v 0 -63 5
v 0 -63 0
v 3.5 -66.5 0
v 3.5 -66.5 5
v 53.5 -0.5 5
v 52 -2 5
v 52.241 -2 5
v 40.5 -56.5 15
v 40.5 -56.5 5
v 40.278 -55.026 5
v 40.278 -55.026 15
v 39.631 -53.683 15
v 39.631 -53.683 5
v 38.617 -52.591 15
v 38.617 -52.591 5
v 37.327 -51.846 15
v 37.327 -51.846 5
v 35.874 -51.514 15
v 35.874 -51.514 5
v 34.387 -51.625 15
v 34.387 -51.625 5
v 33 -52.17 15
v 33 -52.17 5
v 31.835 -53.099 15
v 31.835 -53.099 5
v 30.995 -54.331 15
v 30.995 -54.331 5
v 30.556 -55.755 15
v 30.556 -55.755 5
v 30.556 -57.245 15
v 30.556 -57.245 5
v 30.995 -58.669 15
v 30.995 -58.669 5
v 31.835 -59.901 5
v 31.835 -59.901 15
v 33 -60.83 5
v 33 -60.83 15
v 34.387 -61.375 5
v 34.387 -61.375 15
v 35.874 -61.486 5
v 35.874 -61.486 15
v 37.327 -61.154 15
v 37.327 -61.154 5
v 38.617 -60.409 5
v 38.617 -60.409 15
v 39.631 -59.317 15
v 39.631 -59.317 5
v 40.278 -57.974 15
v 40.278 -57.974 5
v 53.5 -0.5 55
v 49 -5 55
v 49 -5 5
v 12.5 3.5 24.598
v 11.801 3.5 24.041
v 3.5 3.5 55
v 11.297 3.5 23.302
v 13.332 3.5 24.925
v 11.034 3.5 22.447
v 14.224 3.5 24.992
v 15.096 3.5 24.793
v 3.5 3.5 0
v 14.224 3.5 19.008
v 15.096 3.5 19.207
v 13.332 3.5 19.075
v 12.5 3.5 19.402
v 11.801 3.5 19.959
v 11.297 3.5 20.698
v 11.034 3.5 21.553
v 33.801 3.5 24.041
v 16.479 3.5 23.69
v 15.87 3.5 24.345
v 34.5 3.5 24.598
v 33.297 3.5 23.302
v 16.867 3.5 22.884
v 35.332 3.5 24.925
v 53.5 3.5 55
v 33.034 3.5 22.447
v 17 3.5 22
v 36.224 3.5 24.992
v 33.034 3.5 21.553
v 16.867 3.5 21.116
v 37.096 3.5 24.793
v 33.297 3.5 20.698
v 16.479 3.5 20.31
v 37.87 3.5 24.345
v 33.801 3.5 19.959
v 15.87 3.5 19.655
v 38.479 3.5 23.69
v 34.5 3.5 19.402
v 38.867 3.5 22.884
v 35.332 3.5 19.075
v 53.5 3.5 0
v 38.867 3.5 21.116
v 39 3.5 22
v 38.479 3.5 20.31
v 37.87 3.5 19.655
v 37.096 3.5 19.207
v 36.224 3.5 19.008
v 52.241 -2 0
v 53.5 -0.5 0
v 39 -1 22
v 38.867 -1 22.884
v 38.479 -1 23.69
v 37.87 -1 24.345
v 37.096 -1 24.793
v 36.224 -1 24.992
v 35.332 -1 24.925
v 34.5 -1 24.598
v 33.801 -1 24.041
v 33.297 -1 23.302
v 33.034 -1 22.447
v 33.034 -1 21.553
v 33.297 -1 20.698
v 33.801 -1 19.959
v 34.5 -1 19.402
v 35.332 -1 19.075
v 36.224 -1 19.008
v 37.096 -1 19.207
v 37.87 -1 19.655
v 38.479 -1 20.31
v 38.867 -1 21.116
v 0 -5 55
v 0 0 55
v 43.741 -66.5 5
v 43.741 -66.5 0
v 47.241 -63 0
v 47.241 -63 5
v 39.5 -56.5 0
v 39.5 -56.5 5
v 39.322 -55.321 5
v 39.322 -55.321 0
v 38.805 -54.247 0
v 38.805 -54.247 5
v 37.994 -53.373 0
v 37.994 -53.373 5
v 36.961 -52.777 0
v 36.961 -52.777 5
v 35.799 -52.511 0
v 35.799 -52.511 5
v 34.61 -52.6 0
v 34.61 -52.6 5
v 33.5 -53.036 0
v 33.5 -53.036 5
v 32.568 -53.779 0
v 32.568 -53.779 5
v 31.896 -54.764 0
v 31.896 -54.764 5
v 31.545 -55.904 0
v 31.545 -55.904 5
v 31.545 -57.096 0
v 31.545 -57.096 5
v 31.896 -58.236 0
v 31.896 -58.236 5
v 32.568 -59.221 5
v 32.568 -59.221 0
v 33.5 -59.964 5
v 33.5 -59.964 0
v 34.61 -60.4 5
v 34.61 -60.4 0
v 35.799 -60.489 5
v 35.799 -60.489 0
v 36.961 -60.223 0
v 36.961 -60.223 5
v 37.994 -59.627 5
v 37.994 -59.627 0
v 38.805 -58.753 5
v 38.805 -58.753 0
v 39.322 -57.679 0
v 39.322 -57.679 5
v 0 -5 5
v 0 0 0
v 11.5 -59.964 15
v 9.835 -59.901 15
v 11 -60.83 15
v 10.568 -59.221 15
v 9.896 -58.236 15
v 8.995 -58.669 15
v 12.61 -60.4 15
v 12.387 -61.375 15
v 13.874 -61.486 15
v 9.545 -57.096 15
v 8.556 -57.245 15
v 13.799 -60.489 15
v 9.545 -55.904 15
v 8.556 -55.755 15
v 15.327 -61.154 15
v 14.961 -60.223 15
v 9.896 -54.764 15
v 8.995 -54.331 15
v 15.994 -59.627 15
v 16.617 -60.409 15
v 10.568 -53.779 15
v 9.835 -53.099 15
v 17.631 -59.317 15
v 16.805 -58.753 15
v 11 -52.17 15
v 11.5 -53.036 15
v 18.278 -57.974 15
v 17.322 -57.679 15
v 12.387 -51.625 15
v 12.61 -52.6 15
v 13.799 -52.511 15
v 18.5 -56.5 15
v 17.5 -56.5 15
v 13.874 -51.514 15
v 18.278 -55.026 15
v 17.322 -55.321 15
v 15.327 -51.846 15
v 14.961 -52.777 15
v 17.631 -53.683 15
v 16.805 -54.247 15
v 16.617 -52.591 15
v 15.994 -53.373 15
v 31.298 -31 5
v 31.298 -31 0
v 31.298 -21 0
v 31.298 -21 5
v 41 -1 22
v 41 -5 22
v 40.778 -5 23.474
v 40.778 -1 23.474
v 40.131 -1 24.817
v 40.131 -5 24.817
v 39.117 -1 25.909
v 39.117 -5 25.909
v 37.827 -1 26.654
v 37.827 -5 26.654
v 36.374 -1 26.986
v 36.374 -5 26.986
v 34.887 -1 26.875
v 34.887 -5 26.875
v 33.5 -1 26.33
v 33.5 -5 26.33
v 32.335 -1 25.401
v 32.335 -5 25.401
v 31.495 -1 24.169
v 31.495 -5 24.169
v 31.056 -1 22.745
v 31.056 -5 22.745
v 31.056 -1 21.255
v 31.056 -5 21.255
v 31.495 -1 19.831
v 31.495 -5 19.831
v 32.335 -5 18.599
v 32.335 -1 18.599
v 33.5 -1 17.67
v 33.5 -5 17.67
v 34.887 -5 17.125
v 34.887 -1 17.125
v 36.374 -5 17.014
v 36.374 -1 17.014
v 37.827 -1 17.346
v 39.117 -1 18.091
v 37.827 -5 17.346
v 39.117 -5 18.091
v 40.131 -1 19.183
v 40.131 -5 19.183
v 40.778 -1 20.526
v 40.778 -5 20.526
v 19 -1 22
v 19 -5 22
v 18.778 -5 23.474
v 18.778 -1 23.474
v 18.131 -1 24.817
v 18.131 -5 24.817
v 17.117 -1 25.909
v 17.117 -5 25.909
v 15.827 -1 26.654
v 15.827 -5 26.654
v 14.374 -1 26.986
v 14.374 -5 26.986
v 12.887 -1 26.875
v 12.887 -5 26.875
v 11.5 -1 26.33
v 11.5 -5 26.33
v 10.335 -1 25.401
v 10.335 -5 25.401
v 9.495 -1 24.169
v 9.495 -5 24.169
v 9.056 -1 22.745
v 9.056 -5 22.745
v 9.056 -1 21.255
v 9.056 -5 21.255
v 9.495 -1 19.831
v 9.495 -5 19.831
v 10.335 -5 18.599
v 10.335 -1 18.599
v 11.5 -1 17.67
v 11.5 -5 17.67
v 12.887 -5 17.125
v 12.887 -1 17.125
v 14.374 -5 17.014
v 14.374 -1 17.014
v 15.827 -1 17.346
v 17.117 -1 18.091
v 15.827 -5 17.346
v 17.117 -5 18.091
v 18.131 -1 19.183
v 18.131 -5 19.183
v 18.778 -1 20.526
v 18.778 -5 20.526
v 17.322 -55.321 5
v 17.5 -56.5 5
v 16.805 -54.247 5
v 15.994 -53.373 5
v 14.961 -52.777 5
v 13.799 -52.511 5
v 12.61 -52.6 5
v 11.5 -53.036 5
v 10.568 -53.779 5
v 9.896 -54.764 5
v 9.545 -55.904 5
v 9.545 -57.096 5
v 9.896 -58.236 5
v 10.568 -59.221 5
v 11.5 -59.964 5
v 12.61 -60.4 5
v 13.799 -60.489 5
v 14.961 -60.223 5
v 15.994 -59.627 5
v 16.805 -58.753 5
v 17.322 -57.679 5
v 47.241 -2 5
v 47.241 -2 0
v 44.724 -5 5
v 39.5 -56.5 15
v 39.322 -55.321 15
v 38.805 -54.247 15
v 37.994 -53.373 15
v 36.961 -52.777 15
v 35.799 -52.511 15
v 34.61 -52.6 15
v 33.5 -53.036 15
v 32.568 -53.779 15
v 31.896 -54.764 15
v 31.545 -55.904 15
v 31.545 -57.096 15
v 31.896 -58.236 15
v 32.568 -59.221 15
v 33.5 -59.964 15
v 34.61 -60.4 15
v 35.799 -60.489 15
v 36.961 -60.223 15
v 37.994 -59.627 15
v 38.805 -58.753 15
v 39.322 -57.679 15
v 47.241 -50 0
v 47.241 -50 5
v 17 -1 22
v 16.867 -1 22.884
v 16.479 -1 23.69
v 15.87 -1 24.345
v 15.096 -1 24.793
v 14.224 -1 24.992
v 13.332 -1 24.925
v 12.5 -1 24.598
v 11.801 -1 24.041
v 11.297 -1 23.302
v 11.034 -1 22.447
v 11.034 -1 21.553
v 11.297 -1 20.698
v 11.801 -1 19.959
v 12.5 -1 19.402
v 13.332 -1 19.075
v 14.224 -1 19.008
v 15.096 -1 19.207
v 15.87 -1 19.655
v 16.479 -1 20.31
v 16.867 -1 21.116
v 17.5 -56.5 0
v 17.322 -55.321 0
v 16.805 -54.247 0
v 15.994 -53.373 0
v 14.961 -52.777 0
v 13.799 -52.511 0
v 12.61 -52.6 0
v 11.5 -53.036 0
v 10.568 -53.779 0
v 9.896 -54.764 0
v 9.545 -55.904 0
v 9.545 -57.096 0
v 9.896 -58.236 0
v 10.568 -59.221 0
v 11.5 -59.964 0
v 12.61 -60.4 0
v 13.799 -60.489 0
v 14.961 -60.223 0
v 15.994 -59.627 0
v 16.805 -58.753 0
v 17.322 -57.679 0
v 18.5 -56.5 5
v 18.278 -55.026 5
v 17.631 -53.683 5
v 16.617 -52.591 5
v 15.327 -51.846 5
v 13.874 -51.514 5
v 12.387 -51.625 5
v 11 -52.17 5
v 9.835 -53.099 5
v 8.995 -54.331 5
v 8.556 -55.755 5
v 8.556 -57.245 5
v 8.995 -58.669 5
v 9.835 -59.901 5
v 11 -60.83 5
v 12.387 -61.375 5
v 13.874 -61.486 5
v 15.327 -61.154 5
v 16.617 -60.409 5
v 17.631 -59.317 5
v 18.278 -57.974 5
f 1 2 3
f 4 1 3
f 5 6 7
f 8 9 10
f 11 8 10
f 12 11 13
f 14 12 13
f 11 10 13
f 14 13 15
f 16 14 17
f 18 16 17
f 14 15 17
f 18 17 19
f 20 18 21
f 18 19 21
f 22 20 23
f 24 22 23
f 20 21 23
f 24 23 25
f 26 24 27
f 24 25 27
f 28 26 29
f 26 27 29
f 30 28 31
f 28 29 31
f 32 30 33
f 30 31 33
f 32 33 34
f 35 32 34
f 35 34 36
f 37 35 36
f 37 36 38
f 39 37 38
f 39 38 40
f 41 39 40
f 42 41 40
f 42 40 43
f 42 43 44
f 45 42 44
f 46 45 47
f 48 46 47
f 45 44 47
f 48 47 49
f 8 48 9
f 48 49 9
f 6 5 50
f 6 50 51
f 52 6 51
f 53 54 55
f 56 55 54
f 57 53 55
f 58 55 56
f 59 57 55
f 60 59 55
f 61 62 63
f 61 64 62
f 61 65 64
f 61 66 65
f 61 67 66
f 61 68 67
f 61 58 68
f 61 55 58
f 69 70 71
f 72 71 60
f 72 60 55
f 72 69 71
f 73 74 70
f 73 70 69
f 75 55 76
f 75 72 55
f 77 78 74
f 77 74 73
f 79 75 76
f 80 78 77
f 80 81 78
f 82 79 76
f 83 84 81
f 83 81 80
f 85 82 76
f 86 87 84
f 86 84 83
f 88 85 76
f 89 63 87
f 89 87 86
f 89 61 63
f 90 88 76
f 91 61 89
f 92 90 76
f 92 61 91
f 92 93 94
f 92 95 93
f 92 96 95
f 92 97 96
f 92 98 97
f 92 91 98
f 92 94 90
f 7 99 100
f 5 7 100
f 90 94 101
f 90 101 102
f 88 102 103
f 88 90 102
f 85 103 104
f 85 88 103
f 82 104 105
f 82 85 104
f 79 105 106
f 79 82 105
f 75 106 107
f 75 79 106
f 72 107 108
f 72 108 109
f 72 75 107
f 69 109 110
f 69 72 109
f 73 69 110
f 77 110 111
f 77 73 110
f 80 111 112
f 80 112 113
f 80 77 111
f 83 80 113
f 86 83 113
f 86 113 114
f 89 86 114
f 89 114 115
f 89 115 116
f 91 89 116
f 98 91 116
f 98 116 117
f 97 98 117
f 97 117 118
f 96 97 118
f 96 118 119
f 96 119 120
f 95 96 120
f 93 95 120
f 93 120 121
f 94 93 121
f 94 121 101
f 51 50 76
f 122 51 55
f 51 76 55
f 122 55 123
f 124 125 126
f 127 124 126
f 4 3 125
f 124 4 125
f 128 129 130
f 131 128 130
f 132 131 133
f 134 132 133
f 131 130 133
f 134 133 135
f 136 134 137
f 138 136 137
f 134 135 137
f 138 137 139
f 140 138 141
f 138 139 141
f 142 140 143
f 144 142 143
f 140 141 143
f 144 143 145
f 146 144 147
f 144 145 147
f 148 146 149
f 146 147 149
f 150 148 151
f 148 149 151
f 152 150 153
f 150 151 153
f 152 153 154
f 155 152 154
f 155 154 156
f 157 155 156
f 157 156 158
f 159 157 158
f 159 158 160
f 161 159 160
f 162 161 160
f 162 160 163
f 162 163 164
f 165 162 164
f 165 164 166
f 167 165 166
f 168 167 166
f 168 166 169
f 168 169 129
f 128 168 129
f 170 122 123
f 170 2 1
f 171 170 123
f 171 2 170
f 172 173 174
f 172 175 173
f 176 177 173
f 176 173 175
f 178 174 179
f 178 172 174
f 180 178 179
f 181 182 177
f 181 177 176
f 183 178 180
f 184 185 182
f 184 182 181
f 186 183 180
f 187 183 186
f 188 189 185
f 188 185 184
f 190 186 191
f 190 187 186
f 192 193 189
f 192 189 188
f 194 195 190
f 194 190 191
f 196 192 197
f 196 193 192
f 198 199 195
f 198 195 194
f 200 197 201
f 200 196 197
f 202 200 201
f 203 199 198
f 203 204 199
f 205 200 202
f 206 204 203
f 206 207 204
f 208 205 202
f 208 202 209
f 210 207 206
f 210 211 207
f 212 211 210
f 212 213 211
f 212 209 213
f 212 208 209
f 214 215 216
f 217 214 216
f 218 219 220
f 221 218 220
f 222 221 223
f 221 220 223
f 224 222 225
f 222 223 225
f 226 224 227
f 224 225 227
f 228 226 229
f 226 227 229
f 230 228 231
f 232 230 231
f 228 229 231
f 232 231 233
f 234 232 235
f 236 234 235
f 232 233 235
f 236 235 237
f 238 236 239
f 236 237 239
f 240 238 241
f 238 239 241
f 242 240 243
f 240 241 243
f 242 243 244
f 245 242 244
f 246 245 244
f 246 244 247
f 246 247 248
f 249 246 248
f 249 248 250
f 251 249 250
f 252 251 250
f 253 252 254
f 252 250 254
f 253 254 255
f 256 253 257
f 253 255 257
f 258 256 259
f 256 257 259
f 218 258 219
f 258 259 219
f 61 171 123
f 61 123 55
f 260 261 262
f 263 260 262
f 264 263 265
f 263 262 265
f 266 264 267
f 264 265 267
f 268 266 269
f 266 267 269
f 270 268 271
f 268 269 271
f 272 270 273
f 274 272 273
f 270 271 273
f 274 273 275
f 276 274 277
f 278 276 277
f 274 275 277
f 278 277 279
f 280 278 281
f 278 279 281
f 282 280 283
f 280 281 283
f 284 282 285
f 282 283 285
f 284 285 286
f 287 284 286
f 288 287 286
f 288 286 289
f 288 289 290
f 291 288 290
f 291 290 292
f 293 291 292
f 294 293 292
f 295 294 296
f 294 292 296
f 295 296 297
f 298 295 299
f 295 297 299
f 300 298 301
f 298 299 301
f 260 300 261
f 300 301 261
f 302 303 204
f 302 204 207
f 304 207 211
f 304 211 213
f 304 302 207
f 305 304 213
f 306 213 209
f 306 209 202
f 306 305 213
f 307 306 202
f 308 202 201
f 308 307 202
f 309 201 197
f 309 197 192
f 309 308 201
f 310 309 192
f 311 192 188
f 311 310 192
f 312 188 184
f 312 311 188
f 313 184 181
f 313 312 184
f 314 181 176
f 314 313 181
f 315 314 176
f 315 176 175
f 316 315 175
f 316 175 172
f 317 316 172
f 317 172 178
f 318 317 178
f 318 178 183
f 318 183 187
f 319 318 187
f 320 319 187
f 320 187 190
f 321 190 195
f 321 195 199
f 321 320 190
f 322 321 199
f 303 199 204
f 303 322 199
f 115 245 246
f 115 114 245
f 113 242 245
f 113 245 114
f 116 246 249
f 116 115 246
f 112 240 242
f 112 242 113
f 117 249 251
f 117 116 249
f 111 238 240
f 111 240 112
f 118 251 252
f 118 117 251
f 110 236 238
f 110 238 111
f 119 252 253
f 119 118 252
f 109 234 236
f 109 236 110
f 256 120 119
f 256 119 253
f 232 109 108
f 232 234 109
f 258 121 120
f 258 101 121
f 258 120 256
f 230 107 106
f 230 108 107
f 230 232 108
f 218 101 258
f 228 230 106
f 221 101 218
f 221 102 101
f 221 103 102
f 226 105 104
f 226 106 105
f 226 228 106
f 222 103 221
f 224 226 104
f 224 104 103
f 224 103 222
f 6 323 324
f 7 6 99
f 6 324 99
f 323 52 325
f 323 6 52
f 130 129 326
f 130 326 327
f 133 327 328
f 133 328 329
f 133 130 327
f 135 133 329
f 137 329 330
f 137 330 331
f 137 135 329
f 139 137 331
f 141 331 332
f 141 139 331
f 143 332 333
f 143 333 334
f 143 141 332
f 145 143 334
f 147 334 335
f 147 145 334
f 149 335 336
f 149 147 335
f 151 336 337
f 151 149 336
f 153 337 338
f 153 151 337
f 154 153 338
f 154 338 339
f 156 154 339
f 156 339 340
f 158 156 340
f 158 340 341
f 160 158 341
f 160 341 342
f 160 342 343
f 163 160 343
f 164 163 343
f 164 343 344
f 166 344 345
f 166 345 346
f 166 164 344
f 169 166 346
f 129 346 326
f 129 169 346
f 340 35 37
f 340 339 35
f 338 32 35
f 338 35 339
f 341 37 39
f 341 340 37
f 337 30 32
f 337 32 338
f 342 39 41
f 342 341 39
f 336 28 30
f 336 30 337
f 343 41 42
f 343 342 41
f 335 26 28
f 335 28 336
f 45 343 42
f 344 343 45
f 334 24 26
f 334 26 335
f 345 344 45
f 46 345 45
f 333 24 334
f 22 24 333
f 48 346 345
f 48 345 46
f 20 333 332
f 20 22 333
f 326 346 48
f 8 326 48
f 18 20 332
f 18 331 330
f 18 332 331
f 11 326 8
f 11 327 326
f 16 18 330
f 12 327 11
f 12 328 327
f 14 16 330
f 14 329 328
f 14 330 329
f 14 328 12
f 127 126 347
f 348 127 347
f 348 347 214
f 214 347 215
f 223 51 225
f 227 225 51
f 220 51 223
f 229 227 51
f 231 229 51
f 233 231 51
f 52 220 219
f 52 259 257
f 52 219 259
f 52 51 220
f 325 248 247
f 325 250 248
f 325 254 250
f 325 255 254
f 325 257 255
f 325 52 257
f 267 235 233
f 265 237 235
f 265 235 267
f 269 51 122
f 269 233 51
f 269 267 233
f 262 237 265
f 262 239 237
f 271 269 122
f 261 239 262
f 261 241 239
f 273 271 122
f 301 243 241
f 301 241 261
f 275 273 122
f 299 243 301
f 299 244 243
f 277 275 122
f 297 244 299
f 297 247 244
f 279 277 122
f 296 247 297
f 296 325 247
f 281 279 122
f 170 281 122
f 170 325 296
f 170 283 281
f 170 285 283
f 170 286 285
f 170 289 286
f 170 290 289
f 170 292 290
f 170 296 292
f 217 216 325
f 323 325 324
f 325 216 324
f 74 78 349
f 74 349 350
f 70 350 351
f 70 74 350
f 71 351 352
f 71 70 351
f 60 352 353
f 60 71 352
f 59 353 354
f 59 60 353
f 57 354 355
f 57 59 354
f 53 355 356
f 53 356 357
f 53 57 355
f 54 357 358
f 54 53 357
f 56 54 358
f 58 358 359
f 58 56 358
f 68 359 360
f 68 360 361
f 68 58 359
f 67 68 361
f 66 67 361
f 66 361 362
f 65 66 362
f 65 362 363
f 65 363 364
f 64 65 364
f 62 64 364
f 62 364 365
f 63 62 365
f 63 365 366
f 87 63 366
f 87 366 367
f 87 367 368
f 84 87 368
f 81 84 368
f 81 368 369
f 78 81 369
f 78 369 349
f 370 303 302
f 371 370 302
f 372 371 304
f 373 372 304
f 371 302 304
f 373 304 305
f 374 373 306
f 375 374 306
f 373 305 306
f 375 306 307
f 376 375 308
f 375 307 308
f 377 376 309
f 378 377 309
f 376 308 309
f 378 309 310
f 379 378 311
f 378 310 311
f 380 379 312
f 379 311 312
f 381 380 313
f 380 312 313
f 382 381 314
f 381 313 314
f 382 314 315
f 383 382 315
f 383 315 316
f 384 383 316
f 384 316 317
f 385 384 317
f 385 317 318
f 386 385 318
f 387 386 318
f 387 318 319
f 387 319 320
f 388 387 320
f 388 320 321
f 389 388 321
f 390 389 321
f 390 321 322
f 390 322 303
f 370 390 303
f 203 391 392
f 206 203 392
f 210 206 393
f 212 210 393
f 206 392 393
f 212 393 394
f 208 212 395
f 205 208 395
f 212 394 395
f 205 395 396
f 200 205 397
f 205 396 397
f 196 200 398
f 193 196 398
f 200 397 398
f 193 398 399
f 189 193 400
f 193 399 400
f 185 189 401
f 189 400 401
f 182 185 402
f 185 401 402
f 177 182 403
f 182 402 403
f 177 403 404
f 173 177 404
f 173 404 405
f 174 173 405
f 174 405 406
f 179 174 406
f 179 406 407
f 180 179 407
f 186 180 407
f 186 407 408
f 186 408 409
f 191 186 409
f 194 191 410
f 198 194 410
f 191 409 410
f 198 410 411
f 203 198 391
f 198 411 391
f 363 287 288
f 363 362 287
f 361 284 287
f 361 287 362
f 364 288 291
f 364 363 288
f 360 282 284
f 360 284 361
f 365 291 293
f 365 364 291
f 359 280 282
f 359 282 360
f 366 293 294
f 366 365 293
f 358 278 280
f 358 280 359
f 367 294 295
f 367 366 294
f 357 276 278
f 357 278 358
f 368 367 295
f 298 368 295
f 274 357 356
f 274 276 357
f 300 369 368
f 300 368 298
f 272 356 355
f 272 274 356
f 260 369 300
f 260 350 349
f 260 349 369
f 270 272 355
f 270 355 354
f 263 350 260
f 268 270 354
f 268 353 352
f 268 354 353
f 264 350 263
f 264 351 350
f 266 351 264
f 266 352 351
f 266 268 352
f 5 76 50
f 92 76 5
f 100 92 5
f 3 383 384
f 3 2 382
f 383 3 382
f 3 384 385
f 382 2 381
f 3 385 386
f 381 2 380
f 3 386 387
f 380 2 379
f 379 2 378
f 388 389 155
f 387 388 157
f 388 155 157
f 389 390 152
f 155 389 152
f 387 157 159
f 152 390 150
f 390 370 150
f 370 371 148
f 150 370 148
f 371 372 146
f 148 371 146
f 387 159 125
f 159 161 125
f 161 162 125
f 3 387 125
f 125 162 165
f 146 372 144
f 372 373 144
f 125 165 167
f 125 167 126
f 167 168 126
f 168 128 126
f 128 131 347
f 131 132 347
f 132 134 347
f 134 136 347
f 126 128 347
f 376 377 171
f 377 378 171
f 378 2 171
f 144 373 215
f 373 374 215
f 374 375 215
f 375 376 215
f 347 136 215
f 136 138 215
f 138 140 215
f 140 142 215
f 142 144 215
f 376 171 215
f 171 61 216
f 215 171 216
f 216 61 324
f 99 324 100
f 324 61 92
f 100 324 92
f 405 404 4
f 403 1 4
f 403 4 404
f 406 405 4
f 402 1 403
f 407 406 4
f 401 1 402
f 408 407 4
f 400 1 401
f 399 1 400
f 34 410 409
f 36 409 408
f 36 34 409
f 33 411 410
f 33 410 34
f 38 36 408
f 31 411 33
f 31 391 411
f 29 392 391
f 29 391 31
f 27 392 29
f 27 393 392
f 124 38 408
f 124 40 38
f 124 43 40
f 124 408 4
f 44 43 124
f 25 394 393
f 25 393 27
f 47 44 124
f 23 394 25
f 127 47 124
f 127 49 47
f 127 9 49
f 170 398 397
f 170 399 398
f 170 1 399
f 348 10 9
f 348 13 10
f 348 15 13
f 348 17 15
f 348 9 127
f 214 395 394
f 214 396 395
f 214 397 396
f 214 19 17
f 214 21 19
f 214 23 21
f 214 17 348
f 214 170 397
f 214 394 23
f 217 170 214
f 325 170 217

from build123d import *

# Parameters (mm, degrees)
BOSS_EXTRUDE1_DEPTH     = 5
BOSS_EXTRUDE2_DEPTH     = 50
CUT_EXTRUDE1_DEPTH      = 99.333615819
CUT_EXTRUDE1_DEPTH_BACK = 99.333615819
SKETCH3_R               = 3
SKETCH4_R               = 5
SKETCH4_R_2             = 4
BOSS_EXTRUDE3_DEPTH     = 10
SKETCH3_3_R             = 5
SKETCH3_3_R_2           = 3
CUT_EXTRUDE2_DEPTH      = 4
ESQUISSE1_R             = 4
ENL_V_MAT_EXTRU_1_DEPTH = 99.916631564


with BuildPart() as part:
    # Sketch1 → Boss-Extrude1 (new body)
    with BuildSketch(Plane.XY):
        Polygon((52.241350553, -2), (53.5, -0.5), (53.5, 3.5), (3.5, 3.5), (0, 0), (0, -63), (3.5, -66.5), (43.741350553, -66.5), (47.241350553, -63), (47.241350553, -50), (31.298457561, -31), (31.298457561, -21), (47.241350553, -2), align=None)
    extrude(amount=BOSS_EXTRUDE1_DEPTH)

    # Sketch2 → Boss-Extrude2 (add)
    with BuildSketch(Plane.XY.offset(5)):
        Polygon((0, -5), (0, 0), (3.5, 3.5), (53.5, 3.5), (53.5, -0.5), (49, -5), align=None)
    extrude(amount=BOSS_EXTRUDE2_DEPTH)

    # Sketch3 → Cut-Extrude1 (cut, two sides: drawn at the far end of the back side and taken through both)
    with BuildSketch(Plane.XZ.offset(5).offset(-CUT_EXTRUDE1_DEPTH_BACK)):
        with Locations((36, 22)):
            Circle(SKETCH3_R)
        with Locations((14, 22)):
            Circle(SKETCH3_R)
    extrude(amount=CUT_EXTRUDE1_DEPTH + CUT_EXTRUDE1_DEPTH_BACK, mode=Mode.SUBTRACT)

    # Sketch4 → Boss-Extrude3 (add)
    # profile 1 of 2: a face of its own
    with BuildSketch(Plane.XY.offset(5)):
        with Locations((13.5, -56.5)):
            Circle(SKETCH4_R)
        with Locations((13.5, -56.5)):
            Circle(SKETCH4_R_2, mode=Mode.SUBTRACT)
    # profile 2 of 2: a face of its own
    with BuildSketch(Plane.XY.offset(5)):
        with Locations((35.5, -56.5)):
            Circle(SKETCH4_R)
        with Locations((35.5, -56.5)):
            Circle(SKETCH4_R_2, mode=Mode.SUBTRACT)
    extrude(amount=BOSS_EXTRUDE3_DEPTH)

    # Sketch3<3> → Cut-Extrude2 (cut)
    # profile 1 of 2: a face of its own
    with BuildSketch(Plane.XZ.offset(5)):
        with Locations((36, 22)):
            Circle(SKETCH3_3_R)
        with Locations((36, 22)):
            Circle(SKETCH3_3_R_2, mode=Mode.SUBTRACT)
    # profile 2 of 2: a face of its own
    with BuildSketch(Plane.XZ.offset(5)):
        with Locations((14, 22)):
            Circle(SKETCH3_3_R)
        with Locations((14, 22)):
            Circle(SKETCH3_3_R_2, mode=Mode.SUBTRACT)
    extrude(amount=-CUT_EXTRUDE2_DEPTH, mode=Mode.SUBTRACT)

    # Esquisse1 → Enlèv. mat.-Extru.1 (cut, through all)
    with BuildSketch(Plane.XY.offset(5)):
        with Locations((35.5, -56.5)):
            Circle(ESQUISSE1_R)
        with Locations((13.5, -56.5)):
            Circle(ESQUISSE1_R)
    extrude(amount=-ENL_V_MAT_EXTRU_1_DEPTH, mode=Mode.SUBTRACT)


solid = part.part
